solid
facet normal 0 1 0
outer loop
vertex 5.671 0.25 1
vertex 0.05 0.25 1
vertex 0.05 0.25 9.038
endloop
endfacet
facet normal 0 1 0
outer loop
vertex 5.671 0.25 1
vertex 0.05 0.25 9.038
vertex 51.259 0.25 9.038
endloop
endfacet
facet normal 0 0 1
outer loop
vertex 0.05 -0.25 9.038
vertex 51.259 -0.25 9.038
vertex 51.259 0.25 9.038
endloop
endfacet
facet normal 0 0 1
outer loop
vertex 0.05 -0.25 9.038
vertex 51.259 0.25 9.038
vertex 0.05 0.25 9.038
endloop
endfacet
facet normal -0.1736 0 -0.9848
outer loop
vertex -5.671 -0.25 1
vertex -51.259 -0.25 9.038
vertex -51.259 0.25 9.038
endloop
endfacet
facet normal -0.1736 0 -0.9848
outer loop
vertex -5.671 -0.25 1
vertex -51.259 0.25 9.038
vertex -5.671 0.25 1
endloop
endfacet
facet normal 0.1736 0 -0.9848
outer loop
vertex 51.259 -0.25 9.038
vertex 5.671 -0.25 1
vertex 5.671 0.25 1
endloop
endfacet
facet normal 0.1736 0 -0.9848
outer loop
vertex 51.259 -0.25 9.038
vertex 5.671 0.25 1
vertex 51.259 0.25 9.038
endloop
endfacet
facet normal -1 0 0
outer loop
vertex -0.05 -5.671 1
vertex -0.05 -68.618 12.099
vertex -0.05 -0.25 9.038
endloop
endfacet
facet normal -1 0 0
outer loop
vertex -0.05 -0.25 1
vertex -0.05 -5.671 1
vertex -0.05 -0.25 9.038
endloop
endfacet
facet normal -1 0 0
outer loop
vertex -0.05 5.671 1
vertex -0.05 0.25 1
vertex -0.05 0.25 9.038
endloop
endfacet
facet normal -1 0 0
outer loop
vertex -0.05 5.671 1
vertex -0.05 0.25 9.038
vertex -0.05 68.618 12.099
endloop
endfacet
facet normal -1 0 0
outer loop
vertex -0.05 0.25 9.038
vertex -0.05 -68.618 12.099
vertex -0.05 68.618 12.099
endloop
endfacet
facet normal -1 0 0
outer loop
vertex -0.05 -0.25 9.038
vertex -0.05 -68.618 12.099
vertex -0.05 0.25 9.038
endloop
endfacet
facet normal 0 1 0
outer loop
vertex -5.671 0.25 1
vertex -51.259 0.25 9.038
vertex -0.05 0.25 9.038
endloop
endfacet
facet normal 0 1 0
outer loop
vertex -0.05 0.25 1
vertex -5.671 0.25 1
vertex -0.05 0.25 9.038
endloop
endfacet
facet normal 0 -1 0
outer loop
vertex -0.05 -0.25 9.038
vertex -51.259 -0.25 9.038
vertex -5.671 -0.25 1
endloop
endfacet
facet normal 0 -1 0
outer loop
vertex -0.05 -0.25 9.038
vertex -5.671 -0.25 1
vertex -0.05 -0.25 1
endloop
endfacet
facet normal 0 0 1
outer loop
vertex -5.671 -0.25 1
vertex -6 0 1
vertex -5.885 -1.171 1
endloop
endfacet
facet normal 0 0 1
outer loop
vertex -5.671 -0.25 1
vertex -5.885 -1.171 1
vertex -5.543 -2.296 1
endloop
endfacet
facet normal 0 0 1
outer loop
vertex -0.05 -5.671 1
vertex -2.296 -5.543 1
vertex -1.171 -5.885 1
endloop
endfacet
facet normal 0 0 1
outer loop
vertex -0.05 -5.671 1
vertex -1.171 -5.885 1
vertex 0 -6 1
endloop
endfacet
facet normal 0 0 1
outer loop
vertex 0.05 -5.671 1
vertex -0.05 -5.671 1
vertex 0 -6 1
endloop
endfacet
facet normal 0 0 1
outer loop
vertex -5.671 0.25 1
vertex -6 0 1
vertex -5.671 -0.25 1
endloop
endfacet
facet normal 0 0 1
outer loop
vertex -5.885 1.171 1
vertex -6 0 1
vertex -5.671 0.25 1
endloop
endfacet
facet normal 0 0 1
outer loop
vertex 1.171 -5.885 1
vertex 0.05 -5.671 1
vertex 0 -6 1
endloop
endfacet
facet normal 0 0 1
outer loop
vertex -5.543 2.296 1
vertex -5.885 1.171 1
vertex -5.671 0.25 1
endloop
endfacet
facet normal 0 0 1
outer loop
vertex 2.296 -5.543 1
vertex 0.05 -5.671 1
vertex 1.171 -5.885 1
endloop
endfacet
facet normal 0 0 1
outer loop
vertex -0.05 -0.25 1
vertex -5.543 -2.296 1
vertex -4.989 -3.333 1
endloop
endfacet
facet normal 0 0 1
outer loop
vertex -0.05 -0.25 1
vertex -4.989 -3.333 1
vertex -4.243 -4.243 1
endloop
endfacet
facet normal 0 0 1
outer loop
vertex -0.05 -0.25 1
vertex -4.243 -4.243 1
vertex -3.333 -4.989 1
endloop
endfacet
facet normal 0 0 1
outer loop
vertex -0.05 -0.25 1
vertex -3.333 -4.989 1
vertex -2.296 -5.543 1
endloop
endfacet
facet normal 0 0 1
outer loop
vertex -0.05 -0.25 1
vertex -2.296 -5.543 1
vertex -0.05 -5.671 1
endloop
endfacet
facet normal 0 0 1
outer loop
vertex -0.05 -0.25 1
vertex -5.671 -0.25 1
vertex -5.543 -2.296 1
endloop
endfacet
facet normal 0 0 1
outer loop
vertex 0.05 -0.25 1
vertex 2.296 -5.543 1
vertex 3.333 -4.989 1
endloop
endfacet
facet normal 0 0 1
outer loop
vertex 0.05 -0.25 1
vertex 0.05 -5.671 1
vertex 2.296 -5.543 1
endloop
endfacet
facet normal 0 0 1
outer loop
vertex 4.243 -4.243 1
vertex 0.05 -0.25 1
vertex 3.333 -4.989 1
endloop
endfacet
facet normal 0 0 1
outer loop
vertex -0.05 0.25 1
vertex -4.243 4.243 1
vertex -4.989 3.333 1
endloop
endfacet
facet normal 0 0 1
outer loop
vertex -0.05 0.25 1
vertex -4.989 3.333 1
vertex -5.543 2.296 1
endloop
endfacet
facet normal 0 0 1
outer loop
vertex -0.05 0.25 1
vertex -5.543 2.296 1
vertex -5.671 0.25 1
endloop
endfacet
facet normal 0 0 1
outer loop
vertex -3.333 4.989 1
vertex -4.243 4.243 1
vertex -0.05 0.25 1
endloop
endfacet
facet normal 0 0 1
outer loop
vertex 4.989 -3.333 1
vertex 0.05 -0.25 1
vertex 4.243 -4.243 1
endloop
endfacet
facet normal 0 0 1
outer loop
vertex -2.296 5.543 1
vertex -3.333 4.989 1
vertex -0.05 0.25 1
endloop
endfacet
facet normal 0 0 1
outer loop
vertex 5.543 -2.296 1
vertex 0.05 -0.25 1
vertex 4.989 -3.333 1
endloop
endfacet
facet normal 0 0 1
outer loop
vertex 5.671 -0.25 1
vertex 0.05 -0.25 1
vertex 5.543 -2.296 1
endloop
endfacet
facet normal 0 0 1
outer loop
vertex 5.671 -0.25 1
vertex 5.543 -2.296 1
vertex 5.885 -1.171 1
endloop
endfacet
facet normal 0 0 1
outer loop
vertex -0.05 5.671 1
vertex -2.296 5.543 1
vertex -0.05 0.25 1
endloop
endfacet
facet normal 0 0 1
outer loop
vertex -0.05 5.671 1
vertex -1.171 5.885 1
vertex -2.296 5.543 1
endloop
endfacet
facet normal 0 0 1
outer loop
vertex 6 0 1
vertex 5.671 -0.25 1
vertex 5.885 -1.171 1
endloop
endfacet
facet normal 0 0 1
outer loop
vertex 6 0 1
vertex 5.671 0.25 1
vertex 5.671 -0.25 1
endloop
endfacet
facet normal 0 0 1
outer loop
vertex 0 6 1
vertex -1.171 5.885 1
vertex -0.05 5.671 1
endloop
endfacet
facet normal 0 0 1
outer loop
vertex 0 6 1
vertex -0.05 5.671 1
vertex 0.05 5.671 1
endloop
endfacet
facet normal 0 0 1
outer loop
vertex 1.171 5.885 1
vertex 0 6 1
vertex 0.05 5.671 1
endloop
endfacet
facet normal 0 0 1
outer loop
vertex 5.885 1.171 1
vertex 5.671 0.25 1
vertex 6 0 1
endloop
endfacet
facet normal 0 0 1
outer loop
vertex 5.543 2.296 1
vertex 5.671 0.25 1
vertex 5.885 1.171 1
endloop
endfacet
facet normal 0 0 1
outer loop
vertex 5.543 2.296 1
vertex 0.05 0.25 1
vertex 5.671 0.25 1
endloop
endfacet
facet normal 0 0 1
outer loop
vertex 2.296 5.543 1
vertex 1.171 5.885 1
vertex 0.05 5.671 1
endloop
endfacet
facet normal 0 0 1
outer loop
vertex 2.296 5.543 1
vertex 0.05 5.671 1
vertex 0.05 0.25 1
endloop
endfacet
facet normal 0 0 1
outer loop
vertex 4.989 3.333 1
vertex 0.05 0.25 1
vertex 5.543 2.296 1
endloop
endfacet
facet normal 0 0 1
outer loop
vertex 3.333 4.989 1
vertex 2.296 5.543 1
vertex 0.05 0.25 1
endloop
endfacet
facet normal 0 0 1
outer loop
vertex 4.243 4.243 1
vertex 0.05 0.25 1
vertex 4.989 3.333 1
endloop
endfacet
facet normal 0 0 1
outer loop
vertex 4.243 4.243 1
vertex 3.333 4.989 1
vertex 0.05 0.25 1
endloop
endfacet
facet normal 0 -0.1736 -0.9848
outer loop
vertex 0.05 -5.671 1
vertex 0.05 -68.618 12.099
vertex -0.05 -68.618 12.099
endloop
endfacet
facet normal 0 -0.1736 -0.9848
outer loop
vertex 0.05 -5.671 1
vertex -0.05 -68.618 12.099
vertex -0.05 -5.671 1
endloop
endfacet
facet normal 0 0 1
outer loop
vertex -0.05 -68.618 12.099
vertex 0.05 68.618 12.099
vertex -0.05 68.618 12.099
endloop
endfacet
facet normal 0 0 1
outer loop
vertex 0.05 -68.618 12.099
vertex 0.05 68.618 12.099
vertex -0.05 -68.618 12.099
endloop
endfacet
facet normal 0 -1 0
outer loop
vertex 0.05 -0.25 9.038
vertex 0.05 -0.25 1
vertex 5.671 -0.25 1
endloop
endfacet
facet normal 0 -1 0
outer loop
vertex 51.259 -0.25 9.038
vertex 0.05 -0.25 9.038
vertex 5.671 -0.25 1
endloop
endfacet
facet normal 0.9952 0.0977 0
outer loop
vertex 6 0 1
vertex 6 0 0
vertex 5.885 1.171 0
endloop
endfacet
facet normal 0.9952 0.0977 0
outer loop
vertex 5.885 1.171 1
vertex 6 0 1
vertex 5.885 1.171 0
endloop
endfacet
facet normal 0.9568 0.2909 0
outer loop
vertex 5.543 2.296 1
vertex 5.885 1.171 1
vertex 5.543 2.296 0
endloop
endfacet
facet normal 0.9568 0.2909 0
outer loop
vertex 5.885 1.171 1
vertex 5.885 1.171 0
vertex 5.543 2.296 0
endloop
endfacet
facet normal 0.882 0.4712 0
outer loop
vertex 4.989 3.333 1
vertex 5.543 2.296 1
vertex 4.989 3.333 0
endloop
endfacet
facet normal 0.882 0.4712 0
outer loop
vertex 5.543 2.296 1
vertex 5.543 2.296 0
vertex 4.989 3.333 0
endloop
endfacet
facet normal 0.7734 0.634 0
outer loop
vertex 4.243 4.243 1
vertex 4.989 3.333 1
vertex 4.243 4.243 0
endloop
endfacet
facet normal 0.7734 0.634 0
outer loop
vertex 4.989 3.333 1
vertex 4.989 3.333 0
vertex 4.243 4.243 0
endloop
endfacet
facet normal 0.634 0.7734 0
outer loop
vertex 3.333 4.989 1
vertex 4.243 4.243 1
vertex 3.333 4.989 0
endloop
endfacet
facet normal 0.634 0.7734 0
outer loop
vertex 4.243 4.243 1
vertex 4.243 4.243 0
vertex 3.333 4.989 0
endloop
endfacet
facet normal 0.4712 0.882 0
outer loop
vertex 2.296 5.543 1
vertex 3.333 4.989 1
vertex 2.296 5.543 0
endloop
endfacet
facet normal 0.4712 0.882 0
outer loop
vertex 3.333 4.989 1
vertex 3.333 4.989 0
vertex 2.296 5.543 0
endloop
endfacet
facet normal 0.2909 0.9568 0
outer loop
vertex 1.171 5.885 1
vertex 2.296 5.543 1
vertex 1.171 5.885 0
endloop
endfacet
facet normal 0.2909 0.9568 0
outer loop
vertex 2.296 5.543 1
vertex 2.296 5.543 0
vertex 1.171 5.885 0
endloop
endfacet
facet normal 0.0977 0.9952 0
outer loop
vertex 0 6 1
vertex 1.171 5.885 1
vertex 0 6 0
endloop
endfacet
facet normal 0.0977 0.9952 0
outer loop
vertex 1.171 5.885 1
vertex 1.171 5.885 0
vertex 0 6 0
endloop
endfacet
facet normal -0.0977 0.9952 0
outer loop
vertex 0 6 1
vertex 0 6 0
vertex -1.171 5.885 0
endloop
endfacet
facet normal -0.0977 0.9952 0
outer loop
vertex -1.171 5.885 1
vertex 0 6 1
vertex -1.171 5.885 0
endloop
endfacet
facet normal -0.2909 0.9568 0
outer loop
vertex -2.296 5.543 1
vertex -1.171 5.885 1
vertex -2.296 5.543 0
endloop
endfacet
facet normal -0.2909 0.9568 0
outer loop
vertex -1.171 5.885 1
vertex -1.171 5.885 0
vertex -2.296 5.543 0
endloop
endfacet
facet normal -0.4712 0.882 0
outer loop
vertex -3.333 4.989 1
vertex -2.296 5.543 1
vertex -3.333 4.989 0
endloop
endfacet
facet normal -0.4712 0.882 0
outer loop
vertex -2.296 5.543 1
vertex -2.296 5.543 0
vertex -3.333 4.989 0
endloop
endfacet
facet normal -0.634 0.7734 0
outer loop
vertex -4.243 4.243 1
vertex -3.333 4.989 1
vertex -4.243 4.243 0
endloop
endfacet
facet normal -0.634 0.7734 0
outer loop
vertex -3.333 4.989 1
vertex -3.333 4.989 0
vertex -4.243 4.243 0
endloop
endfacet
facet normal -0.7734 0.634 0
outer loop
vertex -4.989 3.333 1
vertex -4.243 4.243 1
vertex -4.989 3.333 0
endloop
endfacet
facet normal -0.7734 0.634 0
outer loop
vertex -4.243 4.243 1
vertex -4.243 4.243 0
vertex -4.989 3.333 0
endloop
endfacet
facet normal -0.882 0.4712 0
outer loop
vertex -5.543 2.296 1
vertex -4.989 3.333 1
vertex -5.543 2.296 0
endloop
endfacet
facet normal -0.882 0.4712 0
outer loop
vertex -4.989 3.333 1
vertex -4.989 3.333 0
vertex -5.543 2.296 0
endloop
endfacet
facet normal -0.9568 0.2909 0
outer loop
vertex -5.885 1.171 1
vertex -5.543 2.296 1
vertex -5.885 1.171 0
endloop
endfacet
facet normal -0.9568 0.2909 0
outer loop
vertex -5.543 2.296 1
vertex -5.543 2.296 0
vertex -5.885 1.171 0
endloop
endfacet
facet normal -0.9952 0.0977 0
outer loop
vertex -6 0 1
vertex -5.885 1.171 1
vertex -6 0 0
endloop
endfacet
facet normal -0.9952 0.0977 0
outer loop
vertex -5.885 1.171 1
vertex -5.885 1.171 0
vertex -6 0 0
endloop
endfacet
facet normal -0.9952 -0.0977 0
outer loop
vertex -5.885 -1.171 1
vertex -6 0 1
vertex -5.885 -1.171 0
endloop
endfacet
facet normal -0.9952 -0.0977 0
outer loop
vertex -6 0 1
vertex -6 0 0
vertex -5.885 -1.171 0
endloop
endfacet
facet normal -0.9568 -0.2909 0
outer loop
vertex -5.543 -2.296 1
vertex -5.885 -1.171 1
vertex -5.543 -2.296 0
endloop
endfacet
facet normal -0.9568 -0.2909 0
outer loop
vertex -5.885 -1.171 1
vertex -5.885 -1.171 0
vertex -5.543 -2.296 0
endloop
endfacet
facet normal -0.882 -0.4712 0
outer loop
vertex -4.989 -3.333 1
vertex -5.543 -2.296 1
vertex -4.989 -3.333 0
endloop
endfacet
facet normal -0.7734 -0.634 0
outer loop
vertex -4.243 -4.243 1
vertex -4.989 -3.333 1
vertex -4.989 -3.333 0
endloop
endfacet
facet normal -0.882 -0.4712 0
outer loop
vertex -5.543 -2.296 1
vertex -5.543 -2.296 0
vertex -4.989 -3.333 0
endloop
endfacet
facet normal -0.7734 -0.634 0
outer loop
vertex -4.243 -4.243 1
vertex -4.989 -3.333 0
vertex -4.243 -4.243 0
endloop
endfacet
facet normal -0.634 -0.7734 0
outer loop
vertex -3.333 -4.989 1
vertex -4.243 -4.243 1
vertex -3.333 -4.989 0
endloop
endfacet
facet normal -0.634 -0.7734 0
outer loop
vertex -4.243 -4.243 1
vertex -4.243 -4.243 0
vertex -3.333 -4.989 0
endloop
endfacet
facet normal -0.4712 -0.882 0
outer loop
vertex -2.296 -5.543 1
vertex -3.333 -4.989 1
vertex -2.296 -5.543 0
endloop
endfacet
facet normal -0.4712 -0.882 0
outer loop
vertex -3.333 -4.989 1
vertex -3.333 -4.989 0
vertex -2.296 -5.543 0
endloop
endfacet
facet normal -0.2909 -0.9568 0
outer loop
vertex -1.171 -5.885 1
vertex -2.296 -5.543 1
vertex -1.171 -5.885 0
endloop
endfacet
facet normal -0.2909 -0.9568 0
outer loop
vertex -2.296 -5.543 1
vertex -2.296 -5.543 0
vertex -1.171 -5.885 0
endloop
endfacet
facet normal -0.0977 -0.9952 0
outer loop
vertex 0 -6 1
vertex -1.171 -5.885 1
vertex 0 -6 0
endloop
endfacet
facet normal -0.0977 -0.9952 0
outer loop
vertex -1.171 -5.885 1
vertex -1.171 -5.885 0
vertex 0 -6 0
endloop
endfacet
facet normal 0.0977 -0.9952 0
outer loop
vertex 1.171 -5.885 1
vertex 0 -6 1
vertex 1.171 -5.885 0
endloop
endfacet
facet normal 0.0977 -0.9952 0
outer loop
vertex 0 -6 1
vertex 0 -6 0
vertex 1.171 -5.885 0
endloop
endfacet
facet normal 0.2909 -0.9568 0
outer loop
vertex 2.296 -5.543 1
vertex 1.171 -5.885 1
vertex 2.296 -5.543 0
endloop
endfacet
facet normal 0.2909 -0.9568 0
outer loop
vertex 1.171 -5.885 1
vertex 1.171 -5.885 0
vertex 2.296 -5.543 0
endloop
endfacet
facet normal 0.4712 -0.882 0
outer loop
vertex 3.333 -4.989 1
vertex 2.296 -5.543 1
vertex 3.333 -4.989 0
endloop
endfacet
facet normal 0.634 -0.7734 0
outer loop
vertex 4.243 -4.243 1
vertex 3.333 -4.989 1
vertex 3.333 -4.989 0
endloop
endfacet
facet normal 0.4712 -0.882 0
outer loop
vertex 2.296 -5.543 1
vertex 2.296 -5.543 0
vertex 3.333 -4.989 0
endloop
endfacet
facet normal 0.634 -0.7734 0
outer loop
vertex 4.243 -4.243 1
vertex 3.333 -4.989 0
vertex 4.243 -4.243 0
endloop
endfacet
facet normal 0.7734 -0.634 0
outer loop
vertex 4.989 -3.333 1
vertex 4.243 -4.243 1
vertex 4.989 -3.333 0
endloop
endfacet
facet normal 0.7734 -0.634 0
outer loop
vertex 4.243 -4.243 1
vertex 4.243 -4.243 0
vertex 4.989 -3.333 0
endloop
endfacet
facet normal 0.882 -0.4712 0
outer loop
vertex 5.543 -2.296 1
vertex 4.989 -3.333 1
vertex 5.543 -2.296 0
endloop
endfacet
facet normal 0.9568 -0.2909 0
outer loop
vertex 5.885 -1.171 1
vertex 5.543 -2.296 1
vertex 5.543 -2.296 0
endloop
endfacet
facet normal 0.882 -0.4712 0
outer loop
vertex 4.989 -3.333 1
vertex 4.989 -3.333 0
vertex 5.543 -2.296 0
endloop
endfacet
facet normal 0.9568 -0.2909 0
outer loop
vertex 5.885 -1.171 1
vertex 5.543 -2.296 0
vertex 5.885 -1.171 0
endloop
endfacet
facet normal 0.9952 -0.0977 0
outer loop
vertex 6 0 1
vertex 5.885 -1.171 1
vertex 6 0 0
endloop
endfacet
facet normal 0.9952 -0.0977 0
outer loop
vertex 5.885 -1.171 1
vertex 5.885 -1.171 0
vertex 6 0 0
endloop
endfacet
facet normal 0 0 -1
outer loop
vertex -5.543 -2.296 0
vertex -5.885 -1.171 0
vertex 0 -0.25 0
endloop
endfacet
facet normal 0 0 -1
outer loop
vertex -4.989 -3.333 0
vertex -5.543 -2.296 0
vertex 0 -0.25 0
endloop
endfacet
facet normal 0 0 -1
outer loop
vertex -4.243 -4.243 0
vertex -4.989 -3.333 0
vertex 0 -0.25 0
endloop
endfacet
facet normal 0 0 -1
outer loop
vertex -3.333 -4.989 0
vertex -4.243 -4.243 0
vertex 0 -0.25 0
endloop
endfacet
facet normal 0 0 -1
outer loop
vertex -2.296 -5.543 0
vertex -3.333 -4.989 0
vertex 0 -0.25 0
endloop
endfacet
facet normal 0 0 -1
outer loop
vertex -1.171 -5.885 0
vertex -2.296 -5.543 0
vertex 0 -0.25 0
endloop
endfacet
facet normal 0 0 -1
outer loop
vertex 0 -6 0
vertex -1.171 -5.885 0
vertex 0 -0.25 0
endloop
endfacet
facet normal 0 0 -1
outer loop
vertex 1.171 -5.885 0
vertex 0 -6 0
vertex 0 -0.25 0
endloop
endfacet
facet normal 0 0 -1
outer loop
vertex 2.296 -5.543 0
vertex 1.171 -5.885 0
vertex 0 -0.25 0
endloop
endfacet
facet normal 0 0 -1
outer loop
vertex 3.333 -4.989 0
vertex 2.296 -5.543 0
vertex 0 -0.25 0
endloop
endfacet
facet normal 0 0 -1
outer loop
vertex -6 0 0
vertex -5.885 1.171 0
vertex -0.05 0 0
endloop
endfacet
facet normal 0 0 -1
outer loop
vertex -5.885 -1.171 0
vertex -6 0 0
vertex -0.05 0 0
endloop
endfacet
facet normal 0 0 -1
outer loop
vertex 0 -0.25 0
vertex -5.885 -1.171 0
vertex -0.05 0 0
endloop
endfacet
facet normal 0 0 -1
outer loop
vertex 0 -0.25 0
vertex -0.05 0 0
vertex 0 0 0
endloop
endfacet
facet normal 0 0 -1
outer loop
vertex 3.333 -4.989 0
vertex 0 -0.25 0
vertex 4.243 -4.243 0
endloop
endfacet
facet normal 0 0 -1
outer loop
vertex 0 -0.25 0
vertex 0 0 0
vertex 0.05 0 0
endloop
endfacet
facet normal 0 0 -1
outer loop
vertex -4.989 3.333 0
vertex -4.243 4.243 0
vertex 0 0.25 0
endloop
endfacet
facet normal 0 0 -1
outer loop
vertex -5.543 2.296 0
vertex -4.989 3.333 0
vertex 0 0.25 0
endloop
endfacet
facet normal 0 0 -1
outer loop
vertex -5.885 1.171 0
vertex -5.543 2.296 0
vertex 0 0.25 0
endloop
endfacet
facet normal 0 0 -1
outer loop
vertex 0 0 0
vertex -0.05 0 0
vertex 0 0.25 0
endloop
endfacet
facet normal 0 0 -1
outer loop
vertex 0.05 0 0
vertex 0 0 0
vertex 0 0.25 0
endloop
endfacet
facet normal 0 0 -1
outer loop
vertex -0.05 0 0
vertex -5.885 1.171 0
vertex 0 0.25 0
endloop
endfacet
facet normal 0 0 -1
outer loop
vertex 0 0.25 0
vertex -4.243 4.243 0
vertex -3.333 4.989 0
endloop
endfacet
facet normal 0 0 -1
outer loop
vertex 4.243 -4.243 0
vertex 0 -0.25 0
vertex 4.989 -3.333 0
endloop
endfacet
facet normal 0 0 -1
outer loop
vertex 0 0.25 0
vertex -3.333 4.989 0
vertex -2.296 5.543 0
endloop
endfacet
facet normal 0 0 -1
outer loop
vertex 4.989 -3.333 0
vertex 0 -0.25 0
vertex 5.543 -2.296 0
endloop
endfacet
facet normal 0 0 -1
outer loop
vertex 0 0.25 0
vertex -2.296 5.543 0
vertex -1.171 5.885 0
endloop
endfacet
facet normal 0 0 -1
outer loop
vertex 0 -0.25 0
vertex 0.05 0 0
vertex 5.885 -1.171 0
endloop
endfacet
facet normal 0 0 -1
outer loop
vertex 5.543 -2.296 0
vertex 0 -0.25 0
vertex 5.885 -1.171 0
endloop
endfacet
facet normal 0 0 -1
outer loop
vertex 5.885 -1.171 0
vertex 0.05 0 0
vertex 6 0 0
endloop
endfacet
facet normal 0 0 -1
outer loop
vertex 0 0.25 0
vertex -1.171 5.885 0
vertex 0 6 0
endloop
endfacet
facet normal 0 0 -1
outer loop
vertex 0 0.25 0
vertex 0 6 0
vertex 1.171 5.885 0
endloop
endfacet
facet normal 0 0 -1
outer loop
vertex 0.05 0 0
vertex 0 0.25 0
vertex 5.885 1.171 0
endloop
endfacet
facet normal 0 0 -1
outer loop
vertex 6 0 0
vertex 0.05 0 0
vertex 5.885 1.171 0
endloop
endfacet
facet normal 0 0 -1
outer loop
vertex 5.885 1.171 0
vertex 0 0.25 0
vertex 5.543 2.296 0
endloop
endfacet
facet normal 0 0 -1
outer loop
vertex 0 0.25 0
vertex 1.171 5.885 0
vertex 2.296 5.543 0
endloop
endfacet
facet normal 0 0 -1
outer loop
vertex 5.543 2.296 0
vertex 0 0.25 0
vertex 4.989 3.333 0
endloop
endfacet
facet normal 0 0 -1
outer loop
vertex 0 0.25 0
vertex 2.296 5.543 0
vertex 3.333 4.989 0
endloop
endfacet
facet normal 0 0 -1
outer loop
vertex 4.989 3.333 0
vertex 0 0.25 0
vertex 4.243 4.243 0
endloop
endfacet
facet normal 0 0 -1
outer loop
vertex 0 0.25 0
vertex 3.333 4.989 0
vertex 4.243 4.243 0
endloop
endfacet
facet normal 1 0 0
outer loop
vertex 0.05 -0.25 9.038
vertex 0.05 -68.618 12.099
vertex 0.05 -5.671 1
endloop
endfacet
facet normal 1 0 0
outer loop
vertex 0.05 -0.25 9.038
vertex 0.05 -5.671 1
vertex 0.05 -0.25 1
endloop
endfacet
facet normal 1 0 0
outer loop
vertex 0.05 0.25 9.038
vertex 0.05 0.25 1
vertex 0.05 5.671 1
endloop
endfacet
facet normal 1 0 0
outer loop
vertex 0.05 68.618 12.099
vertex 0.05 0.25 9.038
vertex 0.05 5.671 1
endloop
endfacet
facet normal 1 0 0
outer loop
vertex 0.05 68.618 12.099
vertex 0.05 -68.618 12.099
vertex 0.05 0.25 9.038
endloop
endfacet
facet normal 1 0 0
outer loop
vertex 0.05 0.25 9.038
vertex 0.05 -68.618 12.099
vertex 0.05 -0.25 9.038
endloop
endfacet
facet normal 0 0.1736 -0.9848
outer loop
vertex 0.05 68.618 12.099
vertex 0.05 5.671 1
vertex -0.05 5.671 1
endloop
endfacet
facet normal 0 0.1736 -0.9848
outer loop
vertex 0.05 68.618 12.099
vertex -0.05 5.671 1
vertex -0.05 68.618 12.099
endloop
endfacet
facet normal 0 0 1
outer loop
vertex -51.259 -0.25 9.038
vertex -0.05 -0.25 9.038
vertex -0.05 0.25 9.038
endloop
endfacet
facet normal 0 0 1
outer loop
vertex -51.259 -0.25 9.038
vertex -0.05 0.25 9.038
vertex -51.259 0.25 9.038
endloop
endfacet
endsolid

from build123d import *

# Parameters (mm, degrees)
F0_R     = 6
F1_DEPTH = 1
F3_DEPTH = 0.05
F5_DEPTH = 0.25


with BuildPart() as f1:
    # F0 (on Top) → F1 (new body)
    with BuildSketch(Plane.XY):
        Circle(F0_R)
    extrude(amount=F1_DEPTH)

    # F2 (on Right) → F3 (join, symmetric)
    with BuildSketch(Plane.YZ):
        Polygon((-68.617978, 12.099201), (0, 0), (68.617978, 12.099201), align=None)
    extrude(amount=F3_DEPTH, both=True)

    # F4 (on Front) → F5 (join, symmetric)
    with BuildSketch(Plane.XZ):
        Polygon((-51.259427, 9.03842), (0, 0), (51.259427, 9.03842), align=None)
    extrude(amount=F5_DEPTH, both=True)


solid = f1.part
